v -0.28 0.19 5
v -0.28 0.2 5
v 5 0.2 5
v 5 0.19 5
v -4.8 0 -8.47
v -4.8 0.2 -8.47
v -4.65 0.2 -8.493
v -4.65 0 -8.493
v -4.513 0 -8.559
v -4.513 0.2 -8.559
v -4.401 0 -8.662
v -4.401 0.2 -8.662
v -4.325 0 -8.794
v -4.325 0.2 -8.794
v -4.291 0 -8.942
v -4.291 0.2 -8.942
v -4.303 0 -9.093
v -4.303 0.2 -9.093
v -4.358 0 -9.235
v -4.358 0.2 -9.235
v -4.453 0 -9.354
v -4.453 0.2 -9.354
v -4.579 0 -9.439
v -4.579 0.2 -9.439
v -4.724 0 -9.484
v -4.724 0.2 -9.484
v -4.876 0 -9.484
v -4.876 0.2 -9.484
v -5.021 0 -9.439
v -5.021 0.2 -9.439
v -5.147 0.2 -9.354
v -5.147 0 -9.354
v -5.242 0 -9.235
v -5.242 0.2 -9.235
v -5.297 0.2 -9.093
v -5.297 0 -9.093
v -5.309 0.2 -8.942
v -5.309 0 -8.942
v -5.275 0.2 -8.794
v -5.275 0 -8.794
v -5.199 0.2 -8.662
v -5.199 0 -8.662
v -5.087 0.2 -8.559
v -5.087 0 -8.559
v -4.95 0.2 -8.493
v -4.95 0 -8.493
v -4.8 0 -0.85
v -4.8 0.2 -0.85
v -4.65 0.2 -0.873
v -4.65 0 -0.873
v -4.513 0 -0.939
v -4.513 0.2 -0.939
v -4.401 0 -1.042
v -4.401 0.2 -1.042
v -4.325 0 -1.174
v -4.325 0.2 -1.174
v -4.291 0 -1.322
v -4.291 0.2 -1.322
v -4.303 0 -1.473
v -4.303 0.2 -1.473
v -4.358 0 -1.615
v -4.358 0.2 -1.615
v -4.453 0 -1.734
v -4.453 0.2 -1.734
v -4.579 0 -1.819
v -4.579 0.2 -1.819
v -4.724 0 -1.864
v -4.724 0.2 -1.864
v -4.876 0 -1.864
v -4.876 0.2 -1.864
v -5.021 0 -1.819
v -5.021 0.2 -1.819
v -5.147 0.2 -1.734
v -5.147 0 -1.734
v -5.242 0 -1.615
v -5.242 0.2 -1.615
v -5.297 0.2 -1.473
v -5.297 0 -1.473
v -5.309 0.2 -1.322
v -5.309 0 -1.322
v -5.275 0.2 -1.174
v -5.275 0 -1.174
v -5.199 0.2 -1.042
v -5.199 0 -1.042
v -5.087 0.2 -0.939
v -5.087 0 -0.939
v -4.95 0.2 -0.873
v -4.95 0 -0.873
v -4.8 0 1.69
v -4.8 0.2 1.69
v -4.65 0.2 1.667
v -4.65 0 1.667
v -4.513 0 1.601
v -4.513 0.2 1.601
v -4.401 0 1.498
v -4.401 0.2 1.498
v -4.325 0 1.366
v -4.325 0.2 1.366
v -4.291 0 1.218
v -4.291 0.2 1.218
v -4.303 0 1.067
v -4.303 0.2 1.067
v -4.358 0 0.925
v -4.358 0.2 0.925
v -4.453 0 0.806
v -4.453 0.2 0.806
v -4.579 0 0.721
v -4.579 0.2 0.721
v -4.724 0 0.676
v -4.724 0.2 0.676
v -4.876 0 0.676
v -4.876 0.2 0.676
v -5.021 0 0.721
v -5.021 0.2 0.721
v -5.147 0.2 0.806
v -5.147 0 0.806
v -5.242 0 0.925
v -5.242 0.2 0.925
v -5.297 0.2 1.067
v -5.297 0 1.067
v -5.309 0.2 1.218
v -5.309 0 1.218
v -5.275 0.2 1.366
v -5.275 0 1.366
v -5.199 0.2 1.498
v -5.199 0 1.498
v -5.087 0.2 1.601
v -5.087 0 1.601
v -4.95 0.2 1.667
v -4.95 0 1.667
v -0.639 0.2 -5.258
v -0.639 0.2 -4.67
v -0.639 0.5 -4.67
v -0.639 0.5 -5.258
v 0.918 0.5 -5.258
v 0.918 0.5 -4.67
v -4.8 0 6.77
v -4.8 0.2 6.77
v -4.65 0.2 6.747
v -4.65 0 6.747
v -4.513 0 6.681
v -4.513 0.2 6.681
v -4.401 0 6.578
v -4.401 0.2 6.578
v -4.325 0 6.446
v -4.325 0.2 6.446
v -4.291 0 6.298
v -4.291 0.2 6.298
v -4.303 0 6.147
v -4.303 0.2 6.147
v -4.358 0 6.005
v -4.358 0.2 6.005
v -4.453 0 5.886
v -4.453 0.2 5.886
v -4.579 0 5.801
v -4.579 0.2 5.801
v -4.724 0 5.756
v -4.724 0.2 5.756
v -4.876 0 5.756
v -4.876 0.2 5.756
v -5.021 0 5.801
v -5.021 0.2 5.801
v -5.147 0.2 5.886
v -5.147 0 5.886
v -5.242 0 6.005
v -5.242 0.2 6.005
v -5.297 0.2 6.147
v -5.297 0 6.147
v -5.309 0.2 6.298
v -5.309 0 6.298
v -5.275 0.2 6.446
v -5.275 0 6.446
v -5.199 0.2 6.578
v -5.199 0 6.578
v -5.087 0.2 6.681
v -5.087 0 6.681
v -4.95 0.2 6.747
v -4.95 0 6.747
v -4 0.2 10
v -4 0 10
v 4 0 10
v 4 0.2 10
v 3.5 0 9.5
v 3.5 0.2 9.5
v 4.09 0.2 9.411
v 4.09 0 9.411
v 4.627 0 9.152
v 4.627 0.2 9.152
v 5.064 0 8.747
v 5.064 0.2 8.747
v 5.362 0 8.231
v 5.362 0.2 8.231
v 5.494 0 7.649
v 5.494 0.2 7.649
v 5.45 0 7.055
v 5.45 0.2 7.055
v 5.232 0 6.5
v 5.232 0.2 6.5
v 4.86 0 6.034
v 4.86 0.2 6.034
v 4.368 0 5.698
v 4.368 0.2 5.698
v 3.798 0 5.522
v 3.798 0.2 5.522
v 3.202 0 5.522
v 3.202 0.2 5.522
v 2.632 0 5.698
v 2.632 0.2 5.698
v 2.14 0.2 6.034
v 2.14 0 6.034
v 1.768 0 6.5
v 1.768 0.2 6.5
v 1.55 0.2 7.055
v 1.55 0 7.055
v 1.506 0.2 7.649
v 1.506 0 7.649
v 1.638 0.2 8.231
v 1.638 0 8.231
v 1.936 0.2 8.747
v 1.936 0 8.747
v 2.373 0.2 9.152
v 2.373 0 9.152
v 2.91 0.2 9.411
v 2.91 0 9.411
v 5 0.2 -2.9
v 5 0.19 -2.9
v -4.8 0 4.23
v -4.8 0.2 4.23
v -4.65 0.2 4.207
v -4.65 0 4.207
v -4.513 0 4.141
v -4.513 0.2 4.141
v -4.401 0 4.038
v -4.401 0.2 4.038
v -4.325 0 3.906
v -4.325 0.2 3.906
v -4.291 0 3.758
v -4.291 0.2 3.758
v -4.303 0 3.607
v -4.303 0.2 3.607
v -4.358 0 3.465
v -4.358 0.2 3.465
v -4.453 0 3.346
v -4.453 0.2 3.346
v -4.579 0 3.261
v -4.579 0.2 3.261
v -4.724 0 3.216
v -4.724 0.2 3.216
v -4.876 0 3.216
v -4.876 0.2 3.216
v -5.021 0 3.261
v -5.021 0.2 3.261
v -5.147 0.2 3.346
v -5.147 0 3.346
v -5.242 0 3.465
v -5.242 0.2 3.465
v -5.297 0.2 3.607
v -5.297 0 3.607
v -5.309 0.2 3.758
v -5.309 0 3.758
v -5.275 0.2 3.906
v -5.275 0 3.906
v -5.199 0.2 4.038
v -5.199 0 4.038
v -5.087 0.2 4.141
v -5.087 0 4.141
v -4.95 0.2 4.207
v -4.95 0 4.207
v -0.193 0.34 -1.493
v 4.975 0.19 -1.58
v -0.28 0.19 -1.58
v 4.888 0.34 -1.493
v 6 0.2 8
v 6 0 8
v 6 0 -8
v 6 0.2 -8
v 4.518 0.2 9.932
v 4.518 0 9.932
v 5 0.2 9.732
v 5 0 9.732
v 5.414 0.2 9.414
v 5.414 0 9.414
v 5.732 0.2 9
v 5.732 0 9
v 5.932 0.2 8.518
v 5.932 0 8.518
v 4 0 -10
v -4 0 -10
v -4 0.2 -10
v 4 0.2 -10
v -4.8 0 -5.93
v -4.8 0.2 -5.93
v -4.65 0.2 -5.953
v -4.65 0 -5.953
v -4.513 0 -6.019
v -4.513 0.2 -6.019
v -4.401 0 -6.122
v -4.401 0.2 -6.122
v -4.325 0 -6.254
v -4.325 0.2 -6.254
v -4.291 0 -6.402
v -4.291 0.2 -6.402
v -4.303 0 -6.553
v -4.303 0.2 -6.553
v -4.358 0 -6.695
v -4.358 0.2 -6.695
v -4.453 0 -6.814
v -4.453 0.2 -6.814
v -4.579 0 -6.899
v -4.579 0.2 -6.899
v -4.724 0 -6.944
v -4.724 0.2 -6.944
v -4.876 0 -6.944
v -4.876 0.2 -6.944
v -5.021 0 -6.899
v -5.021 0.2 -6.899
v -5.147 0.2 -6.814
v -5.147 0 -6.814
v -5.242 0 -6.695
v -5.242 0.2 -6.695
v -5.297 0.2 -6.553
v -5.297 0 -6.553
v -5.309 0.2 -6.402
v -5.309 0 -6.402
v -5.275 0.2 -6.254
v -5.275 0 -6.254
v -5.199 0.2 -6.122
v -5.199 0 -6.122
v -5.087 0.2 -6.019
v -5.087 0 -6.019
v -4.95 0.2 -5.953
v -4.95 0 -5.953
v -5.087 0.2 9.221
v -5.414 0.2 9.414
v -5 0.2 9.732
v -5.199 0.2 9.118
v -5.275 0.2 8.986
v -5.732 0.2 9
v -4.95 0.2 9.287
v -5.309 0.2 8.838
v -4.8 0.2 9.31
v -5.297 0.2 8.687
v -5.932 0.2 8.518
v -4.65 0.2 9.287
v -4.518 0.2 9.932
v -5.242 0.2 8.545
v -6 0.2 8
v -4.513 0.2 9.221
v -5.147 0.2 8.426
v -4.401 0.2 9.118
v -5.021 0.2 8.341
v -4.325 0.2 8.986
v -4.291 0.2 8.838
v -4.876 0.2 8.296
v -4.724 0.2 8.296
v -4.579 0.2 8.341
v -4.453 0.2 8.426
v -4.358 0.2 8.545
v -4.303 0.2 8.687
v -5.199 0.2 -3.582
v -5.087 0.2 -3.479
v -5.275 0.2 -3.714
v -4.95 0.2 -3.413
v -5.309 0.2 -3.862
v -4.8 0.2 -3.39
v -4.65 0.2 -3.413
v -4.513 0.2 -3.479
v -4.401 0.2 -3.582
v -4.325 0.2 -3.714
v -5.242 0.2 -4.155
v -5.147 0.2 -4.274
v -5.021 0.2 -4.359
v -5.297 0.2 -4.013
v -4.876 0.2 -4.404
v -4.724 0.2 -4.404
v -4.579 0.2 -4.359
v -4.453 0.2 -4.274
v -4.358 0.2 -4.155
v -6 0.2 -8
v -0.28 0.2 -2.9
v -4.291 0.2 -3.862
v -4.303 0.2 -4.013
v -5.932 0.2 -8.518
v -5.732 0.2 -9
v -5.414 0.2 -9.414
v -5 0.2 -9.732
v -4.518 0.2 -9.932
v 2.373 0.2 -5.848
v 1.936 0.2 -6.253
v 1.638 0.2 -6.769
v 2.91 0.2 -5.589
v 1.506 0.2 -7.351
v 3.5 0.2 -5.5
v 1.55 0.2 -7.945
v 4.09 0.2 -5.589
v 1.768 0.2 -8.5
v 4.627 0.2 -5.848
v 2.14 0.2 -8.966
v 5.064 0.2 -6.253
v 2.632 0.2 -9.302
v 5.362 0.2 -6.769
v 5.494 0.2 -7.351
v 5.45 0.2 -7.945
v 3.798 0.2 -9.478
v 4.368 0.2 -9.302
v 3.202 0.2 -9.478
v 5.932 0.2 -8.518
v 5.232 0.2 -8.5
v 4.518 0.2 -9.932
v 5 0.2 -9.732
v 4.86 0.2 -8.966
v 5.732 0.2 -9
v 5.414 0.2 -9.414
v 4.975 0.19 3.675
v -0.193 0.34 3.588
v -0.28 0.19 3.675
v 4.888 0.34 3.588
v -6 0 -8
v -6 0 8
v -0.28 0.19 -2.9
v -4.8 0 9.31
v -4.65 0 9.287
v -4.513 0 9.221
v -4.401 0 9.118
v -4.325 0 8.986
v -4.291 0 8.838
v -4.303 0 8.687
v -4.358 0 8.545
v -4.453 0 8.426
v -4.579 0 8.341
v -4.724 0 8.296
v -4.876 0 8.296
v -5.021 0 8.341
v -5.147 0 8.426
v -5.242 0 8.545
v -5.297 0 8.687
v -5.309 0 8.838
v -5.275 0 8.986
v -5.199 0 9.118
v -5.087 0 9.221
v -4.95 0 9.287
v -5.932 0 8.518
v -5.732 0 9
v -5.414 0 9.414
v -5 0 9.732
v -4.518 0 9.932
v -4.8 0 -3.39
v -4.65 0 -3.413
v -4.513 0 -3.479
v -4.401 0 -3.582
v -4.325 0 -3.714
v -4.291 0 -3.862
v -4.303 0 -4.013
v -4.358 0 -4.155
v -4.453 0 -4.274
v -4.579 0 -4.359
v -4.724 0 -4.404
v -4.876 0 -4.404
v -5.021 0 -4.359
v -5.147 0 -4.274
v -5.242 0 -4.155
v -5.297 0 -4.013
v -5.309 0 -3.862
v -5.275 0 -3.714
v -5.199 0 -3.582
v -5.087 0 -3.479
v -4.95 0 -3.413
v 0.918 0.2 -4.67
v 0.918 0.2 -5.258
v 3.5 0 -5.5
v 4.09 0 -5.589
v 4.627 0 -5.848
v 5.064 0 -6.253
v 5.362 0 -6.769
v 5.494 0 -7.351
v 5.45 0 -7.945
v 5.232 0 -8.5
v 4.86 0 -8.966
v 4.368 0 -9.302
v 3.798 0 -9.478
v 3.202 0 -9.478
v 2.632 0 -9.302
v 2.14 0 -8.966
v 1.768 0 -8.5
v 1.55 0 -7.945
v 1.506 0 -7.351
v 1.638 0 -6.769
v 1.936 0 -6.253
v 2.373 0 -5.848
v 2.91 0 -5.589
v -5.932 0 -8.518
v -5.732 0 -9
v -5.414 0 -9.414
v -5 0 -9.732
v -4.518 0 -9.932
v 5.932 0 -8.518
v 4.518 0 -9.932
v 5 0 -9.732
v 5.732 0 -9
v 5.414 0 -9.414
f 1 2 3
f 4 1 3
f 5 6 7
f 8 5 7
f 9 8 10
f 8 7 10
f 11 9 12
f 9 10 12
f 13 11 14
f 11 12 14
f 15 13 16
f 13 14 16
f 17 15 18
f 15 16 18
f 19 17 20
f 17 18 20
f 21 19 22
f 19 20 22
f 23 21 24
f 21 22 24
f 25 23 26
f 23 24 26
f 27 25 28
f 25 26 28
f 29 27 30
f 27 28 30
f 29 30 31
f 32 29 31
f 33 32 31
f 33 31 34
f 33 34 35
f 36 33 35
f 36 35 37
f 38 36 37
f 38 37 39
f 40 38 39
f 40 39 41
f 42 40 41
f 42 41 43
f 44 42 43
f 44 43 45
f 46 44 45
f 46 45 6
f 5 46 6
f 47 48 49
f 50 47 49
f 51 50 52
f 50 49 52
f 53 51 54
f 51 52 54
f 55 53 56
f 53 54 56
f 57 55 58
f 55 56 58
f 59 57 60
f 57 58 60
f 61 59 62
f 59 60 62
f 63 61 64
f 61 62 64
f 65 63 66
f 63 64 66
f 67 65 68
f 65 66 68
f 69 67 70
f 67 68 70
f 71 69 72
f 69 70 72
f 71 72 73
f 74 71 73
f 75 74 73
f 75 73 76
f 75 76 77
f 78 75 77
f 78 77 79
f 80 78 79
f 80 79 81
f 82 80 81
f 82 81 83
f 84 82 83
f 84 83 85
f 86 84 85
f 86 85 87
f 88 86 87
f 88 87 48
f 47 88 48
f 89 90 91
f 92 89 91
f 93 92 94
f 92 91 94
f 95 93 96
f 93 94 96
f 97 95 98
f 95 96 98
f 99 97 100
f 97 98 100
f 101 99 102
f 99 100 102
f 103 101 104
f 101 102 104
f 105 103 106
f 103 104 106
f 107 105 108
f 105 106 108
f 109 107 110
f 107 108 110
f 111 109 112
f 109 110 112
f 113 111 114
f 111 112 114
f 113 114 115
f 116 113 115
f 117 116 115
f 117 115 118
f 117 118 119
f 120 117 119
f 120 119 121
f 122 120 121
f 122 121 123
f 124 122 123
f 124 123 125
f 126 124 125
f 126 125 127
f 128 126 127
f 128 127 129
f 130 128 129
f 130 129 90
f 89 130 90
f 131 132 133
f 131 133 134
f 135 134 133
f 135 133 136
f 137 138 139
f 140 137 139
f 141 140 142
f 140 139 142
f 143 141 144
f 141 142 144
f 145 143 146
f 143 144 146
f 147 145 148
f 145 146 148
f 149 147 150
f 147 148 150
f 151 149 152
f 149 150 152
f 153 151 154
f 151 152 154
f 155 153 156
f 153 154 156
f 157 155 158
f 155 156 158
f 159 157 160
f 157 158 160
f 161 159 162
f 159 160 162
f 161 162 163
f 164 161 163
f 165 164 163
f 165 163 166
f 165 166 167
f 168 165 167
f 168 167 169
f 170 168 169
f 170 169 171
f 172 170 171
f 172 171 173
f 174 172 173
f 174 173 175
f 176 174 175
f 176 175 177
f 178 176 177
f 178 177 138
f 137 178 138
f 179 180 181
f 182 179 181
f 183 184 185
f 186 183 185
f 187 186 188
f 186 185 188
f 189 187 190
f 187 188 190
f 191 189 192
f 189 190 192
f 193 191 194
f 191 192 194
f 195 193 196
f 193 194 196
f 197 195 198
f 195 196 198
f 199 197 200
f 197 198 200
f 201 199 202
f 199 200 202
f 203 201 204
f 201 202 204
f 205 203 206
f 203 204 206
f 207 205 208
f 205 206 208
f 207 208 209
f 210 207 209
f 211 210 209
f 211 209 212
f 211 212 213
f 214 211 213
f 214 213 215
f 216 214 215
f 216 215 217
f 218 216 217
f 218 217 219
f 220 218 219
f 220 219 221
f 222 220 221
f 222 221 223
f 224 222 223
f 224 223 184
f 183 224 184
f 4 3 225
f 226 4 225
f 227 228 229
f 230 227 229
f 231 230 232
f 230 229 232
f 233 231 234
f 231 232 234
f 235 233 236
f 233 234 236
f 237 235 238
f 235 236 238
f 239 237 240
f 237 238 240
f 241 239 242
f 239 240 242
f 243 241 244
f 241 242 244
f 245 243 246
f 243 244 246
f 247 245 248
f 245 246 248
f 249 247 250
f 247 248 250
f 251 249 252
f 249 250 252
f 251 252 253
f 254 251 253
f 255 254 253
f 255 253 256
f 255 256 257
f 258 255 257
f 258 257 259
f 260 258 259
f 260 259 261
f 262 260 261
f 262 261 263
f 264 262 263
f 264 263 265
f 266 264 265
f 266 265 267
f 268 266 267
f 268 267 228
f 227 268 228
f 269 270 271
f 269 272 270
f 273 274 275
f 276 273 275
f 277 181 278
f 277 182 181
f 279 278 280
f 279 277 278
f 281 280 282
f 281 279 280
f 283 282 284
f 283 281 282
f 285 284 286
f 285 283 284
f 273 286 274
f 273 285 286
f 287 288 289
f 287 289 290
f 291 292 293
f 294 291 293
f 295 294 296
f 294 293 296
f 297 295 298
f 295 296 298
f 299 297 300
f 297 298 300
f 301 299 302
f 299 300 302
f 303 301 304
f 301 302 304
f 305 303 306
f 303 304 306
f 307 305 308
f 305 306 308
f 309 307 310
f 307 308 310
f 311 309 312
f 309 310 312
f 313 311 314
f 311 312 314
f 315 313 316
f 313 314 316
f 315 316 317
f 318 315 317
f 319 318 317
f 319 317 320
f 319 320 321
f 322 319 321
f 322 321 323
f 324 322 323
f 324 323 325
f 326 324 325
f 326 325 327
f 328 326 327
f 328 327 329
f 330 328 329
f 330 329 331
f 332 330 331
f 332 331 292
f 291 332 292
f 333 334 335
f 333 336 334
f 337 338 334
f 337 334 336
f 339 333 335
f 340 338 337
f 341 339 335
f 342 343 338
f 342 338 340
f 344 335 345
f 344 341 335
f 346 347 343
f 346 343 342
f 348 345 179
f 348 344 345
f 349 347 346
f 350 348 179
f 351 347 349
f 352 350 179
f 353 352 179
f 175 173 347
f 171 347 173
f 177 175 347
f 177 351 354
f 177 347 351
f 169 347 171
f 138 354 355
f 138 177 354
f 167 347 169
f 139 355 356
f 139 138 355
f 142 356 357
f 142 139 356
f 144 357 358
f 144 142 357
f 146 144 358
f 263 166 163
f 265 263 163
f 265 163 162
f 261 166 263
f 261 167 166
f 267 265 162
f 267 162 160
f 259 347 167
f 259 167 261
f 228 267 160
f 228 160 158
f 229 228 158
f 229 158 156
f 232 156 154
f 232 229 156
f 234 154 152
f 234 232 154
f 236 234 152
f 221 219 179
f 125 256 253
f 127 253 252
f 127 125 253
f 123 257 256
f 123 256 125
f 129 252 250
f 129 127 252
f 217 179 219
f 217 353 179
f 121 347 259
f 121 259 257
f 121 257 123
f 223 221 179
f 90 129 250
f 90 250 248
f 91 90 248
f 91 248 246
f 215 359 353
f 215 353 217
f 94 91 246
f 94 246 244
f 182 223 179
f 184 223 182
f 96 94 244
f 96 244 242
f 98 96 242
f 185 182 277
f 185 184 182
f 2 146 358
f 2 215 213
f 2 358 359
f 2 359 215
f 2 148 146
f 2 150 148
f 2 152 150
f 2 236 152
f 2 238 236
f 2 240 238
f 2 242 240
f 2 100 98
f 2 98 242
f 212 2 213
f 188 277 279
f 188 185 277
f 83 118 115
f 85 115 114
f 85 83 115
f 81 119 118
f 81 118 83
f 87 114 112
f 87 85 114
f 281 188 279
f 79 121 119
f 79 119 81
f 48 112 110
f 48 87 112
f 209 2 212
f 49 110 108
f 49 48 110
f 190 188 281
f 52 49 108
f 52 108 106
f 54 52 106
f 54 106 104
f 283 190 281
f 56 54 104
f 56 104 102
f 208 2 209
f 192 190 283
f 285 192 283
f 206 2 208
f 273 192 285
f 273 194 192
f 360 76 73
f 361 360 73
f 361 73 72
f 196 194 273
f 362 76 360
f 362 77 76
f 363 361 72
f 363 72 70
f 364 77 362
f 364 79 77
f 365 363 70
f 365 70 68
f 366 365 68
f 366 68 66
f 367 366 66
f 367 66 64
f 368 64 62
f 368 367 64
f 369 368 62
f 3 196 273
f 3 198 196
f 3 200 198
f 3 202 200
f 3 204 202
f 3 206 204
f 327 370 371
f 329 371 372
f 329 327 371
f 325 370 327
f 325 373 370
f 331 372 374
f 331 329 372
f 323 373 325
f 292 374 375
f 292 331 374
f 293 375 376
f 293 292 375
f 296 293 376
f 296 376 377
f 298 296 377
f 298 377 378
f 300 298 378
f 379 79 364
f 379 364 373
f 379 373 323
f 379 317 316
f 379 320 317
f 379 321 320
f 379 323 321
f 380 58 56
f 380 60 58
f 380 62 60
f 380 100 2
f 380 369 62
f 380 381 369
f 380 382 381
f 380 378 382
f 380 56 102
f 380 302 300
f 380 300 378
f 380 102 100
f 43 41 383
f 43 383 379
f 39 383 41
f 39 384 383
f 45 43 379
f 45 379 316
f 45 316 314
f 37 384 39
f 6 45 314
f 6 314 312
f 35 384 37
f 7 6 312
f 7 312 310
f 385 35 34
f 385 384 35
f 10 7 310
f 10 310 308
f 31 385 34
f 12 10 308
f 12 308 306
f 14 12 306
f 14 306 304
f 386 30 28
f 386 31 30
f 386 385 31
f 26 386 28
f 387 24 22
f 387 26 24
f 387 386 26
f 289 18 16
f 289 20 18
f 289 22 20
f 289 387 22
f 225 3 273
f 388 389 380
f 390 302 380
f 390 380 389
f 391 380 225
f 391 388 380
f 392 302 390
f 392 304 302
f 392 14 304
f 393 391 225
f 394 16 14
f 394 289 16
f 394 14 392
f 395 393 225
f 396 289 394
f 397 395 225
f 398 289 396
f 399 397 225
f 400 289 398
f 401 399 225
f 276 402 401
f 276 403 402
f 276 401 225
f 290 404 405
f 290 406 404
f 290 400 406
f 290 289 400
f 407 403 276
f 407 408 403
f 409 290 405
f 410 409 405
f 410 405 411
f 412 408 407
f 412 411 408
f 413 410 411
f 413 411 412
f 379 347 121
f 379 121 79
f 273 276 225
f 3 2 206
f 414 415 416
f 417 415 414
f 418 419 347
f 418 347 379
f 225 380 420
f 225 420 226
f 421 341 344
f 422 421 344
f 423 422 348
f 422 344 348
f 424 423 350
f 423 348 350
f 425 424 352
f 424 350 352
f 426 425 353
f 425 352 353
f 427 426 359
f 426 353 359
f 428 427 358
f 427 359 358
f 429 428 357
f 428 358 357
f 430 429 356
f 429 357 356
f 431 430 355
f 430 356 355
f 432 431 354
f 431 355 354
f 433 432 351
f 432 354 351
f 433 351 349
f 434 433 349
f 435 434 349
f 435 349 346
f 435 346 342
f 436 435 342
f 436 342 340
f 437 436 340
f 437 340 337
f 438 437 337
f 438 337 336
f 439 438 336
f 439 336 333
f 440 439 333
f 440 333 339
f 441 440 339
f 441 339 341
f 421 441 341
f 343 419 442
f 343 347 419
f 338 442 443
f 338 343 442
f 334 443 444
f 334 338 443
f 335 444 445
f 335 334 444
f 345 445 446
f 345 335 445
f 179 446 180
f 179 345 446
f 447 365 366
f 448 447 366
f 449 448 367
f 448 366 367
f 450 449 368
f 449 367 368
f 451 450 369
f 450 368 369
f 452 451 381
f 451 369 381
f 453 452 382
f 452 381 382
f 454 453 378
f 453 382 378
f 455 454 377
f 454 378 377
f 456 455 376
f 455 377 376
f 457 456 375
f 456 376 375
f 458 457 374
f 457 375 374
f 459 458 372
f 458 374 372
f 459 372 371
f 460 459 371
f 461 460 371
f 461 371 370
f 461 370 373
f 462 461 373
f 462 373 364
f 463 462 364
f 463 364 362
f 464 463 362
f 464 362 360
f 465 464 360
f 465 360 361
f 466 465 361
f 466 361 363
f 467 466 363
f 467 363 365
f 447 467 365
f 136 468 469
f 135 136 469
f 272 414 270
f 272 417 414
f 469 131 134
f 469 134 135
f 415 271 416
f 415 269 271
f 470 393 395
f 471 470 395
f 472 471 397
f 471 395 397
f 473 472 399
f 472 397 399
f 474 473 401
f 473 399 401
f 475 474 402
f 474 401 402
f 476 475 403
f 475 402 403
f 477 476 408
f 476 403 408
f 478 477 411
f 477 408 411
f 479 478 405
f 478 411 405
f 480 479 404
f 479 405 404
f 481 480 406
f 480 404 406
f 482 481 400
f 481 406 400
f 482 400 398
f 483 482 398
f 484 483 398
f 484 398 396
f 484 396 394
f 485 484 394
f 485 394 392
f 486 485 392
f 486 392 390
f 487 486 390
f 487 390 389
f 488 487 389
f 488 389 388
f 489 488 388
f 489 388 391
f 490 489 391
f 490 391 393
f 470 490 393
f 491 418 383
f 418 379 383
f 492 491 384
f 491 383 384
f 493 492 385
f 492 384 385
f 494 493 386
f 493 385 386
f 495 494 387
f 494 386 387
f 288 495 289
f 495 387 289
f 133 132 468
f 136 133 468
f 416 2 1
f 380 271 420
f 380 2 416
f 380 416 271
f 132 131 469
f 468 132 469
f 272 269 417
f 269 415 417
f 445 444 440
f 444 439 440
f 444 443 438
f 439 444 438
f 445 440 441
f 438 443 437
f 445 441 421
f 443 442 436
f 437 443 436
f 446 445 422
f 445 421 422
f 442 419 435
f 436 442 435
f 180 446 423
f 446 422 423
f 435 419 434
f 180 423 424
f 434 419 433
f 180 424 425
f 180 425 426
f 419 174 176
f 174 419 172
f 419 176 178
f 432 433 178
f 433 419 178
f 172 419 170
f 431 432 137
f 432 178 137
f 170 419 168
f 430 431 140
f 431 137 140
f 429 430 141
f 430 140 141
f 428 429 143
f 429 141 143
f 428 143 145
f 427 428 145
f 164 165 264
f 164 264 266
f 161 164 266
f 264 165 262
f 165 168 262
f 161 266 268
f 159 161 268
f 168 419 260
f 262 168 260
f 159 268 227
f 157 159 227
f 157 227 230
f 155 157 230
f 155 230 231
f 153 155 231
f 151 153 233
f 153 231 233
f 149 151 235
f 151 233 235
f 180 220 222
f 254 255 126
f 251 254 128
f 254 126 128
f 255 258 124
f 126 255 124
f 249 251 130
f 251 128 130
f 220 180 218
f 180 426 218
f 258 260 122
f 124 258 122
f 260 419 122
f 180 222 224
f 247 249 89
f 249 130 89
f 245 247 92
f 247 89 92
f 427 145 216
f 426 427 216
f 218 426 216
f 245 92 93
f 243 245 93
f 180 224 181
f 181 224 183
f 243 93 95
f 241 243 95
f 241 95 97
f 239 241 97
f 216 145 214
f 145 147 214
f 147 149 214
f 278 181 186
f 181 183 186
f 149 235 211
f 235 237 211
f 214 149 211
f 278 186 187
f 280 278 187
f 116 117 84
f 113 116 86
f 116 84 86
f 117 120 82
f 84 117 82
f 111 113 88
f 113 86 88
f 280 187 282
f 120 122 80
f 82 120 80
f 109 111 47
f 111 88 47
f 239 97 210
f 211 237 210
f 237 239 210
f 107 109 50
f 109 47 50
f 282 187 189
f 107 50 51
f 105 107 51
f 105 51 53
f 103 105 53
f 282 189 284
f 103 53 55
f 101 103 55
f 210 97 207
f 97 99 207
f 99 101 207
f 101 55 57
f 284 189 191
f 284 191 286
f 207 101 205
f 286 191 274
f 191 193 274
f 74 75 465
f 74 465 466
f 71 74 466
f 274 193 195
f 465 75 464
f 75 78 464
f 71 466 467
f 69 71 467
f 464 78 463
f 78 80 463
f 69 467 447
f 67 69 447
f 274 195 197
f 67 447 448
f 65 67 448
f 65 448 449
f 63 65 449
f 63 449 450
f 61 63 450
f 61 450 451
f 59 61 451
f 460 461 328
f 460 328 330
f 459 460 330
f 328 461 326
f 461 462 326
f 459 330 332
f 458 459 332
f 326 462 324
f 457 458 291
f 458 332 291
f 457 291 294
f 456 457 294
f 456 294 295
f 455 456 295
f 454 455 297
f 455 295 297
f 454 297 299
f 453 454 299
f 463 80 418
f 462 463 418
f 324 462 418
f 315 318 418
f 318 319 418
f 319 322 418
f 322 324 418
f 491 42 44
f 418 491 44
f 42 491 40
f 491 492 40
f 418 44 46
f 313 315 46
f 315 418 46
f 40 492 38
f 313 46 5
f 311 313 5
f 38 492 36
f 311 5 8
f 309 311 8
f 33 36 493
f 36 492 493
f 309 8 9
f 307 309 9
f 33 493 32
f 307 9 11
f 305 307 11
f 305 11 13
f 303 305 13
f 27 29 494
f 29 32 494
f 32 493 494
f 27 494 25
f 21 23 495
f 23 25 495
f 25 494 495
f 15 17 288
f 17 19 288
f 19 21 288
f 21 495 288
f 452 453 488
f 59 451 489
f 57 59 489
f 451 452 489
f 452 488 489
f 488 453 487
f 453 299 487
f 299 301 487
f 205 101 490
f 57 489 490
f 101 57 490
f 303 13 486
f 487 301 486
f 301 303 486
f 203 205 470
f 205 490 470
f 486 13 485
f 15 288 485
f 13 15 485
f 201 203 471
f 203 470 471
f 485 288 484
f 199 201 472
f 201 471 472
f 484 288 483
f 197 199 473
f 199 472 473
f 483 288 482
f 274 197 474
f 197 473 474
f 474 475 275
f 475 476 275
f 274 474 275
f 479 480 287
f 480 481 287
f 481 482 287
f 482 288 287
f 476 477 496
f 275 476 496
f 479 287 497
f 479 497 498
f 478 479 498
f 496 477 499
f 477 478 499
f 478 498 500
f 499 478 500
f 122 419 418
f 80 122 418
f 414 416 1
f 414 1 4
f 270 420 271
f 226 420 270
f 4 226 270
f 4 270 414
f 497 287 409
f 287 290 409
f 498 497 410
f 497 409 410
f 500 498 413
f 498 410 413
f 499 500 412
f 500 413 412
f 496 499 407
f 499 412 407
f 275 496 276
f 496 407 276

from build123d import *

# Parameters (mm, degrees)
SKETCH1_W           = 12
SKETCH1_H           = 20
BOSS_EXTRUDE1_DEPTH = 0.2
SKETCH3_R           = 0.51
CUT_EXTRUDE1_DEPTH  = 1
SKETCH4_R           = 2
CUT_EXTRUDE2_DEPTH  = 1
SKETCH5_W           = 5.28
SKETCH5_H           = 7.9
CUT_EXTRUDE3_DEPTH  = 0.01
FILLET1_R           = 2
SKETCH6_W           = 1.557265295
SKETCH6_H           = 0.588722246
BOSS_EXTRUDE2_DEPTH = 0.3
SKETCH7_W           = 5.255
SKETCH7_H           = 5.255
BOSS_EXTRUDE3_DEPTH = 0.15
BOSS_EXTRUDE3_TAPER = 30


with BuildPart() as part:
    # Sketch1 → Boss-Extrude1 (new body)
    with BuildSketch(Plane(origin=(0, 0, 0), x_dir=(1, 0, 0), z_dir=(0, 1, 0))):
        Rectangle(SKETCH1_W, SKETCH1_H)
    extrude(amount=BOSS_EXTRUDE1_DEPTH)

    # Sketch3 → Cut-Extrude1 (cut)
    with BuildSketch(Plane(origin=(0, 0.2, 0), x_dir=(1, 0, 0), z_dir=(0, 1, 0))):
        with Locations(Location((-4.8, -8.8, 0), (0, 0, 270))):
            Circle(SKETCH3_R)
        with Locations(Location((-4.8, -6.26, 0), (0, 0, 270))):
            Circle(SKETCH3_R)
        with Locations(Location((-4.8, -3.72, 0), (0, 0, 270))):
            Circle(SKETCH3_R)
        with Locations(Location((-4.8, -1.18, 0), (0, 0, 270))):
            Circle(SKETCH3_R)
        with Locations(Location((-4.8, 1.36, 0), (0, 0, 270))):
            Circle(SKETCH3_R)
        with Locations(Location((-4.8, 3.9, 0), (0, 0, 270))):
            Circle(SKETCH3_R)
        with Locations(Location((-4.8, 6.44, 0), (0, 0, 270))):
            Circle(SKETCH3_R)
        with Locations(Location((-4.8, 8.98, 0), (0, 0, 270))):
            Circle(SKETCH3_R)
    extrude(amount=-CUT_EXTRUDE1_DEPTH, mode=Mode.SUBTRACT)

    # Sketch4 → Cut-Extrude2 (cut)
    with BuildSketch(Plane(origin=(0, 0.2, 0), x_dir=(1, 0, 0), z_dir=(0, 1, 0))):
        with Locations(Location((3.5, 7.5, 0), (0, 0, 270))):
            Circle(SKETCH4_R)
        with Locations(Location((3.5, -7.5, 0), (0, 0, 270))):
            Circle(SKETCH4_R)
    extrude(amount=-CUT_EXTRUDE2_DEPTH, mode=Mode.SUBTRACT)

    # Sketch5 → Cut-Extrude3 (cut)
    with BuildSketch(Plane(origin=(0, 0.2, 0), x_dir=(1, 0, 0), z_dir=(0, 1, 0))):
        with Locations((2.36, -1.05)):
            Rectangle(SKETCH5_W, SKETCH5_H)
    extrude(amount=-CUT_EXTRUDE3_DEPTH, mode=Mode.SUBTRACT)

    # Fillet1
    fillet1_edges = [part.edges().sort_by_distance(p)[0] for p in [
        (6, 0.1, 10),
        (-6, 0.1, 10),
        (-6, 0.1, -10),
        (6, 0.1, -10),
    ]]
    fillet(fillet1_edges, radius=FILLET1_R)

    # Sketch7 → Boss-Extrude3 (add)
    with BuildSketch(Plane(origin=(0, 0.19, 0), x_dir=(1, 0, 0), z_dir=(0, 1, 0))):
        with Locations((2.3475, -1.0475)):
            Rectangle(SKETCH7_W, SKETCH7_H)
    extrude(amount=BOSS_EXTRUDE3_DEPTH, taper=BOSS_EXTRUDE3_TAPER)


with BuildPart() as body_2:
    # Sketch6 → Boss-Extrude2 (new body)
    with BuildSketch(Plane(origin=(0, 0.2, 0), x_dir=(1, 0, 0), z_dir=(0, 1, 0))):
        with Locations((0.139479445, 4.964058352)):
            Rectangle(SKETCH6_W, SKETCH6_H)
    extrude(amount=BOSS_EXTRUDE2_DEPTH)


solid = Compound([part.part, body_2.part])
